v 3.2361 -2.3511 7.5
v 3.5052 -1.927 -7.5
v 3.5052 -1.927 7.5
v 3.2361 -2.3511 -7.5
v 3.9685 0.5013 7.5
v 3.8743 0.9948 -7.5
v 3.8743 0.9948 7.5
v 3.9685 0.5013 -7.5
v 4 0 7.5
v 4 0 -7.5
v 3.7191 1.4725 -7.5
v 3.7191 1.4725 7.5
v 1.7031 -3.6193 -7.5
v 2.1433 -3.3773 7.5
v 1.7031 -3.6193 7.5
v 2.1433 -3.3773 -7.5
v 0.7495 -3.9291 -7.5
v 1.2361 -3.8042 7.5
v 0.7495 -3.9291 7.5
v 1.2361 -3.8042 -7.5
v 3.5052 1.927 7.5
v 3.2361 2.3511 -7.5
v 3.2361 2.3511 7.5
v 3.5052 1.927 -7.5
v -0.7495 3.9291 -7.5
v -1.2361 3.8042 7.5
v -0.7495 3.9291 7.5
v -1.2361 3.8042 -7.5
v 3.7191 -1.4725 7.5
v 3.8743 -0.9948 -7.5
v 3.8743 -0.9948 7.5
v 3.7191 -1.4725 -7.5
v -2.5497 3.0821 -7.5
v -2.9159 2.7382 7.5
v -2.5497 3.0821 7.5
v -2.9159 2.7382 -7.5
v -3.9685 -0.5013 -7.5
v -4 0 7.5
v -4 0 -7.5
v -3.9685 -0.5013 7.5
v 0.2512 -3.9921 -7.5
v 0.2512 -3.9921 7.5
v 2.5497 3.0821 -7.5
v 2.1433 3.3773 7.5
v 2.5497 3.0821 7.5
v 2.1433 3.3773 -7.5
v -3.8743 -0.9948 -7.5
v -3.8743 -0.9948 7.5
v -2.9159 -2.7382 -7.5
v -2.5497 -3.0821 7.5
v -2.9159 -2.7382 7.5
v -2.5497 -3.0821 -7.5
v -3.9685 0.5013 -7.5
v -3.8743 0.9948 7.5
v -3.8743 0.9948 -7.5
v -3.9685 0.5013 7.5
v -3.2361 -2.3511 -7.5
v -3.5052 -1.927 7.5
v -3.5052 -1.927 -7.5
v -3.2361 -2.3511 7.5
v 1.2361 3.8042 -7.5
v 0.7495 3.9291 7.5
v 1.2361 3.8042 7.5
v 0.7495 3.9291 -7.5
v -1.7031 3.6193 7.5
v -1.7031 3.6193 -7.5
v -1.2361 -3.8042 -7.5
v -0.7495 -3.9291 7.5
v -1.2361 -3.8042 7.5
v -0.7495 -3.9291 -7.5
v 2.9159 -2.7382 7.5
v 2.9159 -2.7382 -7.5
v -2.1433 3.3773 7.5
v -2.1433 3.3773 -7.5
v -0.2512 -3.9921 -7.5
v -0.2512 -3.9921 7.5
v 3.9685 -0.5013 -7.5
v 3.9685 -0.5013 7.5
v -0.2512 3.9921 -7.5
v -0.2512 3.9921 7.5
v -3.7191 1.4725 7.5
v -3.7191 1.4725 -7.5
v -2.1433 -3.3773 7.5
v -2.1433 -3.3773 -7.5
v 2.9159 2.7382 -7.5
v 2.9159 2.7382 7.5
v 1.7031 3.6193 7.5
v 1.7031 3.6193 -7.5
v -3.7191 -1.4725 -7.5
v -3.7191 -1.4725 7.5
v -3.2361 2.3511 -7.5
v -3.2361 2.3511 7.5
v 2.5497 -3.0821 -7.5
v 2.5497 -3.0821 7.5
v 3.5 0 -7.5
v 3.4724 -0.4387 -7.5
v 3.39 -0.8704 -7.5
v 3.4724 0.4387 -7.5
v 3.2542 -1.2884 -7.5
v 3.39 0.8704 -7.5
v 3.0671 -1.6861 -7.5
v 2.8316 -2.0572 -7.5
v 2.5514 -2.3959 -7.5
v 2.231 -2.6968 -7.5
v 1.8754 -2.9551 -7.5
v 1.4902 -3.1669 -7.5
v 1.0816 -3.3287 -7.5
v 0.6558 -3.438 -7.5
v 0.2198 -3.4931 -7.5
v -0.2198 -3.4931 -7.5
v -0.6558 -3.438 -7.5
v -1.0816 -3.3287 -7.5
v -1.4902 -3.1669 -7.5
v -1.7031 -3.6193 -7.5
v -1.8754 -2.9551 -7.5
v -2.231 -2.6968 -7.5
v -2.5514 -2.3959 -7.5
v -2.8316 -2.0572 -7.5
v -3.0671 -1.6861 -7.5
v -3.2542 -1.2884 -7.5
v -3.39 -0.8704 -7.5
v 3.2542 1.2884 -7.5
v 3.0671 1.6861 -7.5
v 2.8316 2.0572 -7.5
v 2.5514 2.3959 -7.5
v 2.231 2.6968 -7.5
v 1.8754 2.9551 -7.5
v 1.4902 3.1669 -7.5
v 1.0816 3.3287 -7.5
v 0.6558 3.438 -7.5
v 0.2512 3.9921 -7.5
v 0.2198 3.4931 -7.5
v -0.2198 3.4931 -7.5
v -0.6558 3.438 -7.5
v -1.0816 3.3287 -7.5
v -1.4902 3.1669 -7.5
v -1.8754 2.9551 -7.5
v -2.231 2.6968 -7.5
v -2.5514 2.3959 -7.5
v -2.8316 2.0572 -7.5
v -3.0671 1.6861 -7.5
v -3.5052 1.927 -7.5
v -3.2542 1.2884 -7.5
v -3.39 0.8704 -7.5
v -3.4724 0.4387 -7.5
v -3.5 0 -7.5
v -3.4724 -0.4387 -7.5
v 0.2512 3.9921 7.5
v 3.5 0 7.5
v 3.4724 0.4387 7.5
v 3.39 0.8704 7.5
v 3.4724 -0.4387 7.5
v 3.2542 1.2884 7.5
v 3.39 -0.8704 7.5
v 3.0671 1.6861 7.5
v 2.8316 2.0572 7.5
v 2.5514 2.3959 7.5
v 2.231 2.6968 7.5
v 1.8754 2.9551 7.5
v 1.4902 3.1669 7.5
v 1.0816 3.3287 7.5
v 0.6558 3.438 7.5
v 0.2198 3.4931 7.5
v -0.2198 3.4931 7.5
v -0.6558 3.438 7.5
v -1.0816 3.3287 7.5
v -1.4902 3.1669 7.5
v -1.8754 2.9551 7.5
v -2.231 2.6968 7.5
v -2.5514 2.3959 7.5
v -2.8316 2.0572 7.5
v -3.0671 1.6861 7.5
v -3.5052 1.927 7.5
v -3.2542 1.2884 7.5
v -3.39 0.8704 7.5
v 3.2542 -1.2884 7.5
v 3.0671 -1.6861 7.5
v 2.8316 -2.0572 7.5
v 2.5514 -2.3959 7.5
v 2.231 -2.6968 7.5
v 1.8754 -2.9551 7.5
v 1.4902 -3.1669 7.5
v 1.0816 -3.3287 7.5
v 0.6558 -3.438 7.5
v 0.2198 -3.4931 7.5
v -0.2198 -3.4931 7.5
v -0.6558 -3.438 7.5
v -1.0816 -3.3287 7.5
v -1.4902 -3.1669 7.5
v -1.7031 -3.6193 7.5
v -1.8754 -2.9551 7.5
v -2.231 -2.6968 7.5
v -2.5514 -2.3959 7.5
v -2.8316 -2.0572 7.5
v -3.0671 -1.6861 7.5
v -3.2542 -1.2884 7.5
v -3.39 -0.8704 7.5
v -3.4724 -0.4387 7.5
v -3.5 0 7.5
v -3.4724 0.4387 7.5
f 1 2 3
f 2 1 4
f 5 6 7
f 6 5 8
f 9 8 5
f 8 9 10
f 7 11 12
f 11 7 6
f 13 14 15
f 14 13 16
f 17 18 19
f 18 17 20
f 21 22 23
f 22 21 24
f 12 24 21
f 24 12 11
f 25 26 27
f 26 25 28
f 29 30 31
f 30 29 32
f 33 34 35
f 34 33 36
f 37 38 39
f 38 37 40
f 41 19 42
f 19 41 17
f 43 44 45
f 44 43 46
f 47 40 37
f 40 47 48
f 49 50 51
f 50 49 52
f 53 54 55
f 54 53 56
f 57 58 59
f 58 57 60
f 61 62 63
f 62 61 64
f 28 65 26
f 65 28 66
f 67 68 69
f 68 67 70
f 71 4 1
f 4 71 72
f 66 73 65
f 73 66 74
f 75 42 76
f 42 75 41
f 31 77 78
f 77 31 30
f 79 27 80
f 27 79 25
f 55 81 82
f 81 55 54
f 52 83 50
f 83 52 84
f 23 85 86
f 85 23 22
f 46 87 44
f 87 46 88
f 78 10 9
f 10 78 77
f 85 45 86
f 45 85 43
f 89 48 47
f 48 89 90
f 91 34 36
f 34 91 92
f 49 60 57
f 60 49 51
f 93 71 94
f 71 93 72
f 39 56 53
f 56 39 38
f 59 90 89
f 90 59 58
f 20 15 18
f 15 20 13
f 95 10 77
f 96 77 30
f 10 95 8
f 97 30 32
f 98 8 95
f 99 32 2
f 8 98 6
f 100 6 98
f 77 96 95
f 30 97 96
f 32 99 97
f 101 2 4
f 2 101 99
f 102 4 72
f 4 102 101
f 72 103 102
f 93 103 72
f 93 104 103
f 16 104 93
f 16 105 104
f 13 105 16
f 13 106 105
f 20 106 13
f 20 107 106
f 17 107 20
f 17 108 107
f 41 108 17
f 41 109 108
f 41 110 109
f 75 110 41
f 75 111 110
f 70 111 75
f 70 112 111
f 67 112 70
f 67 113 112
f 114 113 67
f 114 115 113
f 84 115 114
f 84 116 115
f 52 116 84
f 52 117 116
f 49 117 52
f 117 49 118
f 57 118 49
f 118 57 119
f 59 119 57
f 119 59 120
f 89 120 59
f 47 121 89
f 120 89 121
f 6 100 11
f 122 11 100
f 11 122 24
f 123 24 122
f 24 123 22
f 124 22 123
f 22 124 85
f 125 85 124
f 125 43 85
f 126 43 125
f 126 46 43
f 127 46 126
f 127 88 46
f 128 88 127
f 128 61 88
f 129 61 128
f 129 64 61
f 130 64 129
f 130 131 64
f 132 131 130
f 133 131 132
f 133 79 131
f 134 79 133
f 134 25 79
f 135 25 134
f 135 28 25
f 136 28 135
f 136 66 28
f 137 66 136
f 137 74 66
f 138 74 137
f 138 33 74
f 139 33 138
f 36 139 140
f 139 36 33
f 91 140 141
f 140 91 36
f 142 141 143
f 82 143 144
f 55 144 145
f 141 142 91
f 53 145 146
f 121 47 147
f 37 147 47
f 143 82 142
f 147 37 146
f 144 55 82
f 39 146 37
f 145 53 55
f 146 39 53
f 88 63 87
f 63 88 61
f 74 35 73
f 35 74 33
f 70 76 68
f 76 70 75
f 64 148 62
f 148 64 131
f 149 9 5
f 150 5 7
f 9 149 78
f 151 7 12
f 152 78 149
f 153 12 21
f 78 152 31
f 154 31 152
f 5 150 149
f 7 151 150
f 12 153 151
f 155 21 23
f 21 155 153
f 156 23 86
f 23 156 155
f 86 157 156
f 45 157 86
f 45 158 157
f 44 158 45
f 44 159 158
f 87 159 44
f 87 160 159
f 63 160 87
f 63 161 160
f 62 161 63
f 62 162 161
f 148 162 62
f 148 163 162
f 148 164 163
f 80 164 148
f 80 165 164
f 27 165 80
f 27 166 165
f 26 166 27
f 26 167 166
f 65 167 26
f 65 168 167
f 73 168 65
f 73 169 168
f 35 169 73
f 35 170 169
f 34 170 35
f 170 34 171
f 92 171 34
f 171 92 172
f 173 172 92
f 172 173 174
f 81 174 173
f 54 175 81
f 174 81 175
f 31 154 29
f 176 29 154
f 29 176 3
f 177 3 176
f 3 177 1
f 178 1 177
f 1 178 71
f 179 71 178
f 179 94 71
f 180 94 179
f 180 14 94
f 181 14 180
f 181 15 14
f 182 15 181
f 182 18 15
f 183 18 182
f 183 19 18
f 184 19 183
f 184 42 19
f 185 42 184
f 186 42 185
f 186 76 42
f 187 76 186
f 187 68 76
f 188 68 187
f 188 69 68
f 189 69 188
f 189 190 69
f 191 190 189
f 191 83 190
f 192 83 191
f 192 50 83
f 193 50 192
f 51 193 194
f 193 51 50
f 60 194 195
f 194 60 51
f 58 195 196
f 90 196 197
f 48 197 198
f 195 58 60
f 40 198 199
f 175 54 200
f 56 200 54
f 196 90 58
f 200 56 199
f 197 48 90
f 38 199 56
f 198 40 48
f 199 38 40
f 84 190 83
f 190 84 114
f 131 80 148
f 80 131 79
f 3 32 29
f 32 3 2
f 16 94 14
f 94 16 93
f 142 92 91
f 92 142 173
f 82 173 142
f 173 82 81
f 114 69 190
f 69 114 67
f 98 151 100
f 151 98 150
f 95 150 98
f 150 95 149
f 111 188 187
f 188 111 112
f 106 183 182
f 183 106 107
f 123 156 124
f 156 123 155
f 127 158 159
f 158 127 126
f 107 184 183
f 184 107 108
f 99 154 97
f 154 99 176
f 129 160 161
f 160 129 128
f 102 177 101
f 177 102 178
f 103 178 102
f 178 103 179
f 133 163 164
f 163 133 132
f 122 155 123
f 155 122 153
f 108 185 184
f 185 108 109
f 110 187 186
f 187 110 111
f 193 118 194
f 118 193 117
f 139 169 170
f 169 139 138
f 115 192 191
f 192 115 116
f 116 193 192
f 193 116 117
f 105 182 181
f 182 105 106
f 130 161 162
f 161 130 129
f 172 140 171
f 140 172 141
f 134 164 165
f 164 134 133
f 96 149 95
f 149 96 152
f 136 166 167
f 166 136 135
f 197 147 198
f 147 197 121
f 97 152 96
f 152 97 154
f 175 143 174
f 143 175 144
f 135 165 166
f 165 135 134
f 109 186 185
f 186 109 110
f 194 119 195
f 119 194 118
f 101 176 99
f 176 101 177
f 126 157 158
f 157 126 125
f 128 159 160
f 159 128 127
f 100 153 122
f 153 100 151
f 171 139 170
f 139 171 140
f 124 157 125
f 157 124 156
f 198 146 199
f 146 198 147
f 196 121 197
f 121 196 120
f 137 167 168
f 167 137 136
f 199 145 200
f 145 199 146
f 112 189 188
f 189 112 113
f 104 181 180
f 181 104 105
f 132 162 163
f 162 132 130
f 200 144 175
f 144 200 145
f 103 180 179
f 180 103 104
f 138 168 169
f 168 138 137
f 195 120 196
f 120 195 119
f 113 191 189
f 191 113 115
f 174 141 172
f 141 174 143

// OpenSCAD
$fn = 50;


difference() {
	union() {
		translate(v = [0, 0, -7.5000000000]) {
			cylinder(h = 15, r = 4.0000000000);
		}
	}
	union() {
		translate(v = [0, 0, -100.0000000000]) {
			cylinder(h = 200, r = 3.5000000000);
		}
	}
}
